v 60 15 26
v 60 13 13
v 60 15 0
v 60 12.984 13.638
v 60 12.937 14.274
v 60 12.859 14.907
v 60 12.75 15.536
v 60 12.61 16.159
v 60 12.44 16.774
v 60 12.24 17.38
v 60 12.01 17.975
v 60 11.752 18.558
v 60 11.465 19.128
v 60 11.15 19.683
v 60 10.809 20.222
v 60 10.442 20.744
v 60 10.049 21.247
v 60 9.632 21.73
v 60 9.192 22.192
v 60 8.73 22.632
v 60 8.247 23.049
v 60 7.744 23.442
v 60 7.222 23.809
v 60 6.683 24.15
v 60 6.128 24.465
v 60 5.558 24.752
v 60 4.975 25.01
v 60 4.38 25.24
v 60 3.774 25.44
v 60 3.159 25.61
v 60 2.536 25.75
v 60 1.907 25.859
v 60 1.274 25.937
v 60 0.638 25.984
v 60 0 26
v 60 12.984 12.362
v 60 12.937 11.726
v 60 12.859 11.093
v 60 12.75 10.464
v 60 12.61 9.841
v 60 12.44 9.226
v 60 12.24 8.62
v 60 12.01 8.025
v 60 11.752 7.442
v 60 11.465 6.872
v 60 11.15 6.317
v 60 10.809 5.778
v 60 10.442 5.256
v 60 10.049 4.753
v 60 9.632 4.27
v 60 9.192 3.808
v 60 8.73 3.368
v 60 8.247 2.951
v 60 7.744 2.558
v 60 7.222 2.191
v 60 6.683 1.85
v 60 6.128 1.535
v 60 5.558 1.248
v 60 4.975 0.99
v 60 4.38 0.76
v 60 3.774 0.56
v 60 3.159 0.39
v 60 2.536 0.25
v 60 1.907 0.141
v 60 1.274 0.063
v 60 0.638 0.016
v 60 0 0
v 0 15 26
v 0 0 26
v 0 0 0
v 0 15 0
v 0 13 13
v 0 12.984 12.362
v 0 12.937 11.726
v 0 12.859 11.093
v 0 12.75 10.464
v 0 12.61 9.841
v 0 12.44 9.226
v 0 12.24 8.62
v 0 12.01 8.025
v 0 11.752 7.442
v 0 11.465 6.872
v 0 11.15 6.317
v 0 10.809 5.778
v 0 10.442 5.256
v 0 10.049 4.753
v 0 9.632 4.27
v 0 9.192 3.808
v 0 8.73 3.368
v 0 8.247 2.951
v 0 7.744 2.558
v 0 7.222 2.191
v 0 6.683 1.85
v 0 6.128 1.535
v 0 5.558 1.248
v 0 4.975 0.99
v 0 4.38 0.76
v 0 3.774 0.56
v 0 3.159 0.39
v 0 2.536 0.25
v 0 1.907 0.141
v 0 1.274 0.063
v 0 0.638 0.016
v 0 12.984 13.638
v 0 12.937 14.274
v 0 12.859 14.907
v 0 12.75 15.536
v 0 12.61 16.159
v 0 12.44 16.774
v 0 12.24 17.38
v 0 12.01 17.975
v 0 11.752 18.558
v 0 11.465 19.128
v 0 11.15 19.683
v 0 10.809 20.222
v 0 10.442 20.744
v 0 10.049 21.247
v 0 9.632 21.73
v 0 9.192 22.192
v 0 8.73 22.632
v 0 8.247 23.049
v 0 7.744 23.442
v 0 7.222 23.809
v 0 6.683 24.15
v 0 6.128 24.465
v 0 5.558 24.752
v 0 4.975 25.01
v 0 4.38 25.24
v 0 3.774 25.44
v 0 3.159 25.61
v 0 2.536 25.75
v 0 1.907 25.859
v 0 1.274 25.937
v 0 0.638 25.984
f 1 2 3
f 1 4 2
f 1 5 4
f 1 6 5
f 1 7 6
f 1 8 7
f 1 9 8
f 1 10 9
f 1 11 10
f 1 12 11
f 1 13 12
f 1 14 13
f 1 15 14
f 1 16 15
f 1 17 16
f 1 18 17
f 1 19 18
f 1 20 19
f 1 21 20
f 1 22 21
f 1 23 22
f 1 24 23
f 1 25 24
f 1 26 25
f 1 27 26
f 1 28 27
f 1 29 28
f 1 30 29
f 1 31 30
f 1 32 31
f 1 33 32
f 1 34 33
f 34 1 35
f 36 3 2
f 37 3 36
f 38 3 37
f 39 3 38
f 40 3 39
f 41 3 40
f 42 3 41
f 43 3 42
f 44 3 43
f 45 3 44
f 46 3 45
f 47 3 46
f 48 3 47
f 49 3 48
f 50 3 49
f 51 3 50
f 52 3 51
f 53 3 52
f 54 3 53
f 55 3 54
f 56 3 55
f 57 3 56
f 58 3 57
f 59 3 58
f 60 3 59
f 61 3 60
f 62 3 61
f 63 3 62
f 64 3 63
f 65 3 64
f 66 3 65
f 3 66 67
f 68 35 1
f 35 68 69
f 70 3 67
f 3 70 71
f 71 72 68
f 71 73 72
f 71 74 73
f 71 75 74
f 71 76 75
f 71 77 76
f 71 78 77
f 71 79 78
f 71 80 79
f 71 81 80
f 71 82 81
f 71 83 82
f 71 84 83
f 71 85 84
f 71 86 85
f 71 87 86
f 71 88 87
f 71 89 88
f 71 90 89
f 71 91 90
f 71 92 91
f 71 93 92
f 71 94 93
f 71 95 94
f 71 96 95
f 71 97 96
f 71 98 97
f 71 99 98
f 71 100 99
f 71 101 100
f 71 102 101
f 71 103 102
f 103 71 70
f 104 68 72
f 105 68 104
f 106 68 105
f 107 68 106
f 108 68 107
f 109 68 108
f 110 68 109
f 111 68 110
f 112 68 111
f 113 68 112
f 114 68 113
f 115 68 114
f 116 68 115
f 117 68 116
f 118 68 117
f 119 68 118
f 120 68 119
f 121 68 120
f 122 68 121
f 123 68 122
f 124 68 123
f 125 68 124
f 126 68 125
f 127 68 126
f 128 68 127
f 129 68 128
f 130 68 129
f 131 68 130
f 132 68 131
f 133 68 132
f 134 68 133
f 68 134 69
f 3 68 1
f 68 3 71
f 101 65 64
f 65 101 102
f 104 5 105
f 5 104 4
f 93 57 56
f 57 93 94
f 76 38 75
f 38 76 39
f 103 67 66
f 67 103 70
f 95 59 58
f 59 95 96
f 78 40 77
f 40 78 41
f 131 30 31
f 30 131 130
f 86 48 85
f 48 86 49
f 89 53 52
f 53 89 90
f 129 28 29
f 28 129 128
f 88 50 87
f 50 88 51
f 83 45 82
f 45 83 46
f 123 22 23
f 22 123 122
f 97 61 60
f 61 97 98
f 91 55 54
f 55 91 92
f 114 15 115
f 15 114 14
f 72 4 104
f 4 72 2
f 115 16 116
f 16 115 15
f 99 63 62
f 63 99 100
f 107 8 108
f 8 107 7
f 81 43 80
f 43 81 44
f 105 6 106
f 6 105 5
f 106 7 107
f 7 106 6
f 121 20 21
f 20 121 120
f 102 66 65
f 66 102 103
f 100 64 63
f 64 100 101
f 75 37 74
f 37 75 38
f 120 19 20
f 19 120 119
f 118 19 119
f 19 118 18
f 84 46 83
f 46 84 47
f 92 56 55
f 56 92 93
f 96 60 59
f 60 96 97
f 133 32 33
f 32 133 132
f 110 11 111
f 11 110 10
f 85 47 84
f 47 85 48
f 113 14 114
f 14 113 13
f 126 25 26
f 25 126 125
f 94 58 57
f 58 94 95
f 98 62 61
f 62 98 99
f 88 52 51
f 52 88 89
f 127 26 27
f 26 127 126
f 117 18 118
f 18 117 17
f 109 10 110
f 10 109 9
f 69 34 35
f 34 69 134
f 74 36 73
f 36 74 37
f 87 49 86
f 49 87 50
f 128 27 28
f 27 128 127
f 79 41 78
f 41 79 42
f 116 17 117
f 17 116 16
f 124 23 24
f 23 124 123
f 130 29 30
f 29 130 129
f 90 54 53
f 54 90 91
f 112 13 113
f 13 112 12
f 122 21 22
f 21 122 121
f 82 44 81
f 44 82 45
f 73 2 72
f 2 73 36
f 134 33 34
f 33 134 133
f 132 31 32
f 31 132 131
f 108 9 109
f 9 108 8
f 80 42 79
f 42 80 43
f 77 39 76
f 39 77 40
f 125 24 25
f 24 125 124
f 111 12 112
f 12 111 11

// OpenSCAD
    difference(){
        cube([60, 15, 26]);
        translate([-5,0,13]){
            rotate([0,90,0]){
                cylinder(r=13, h=70, $fn=128);
            }
        }
    }
